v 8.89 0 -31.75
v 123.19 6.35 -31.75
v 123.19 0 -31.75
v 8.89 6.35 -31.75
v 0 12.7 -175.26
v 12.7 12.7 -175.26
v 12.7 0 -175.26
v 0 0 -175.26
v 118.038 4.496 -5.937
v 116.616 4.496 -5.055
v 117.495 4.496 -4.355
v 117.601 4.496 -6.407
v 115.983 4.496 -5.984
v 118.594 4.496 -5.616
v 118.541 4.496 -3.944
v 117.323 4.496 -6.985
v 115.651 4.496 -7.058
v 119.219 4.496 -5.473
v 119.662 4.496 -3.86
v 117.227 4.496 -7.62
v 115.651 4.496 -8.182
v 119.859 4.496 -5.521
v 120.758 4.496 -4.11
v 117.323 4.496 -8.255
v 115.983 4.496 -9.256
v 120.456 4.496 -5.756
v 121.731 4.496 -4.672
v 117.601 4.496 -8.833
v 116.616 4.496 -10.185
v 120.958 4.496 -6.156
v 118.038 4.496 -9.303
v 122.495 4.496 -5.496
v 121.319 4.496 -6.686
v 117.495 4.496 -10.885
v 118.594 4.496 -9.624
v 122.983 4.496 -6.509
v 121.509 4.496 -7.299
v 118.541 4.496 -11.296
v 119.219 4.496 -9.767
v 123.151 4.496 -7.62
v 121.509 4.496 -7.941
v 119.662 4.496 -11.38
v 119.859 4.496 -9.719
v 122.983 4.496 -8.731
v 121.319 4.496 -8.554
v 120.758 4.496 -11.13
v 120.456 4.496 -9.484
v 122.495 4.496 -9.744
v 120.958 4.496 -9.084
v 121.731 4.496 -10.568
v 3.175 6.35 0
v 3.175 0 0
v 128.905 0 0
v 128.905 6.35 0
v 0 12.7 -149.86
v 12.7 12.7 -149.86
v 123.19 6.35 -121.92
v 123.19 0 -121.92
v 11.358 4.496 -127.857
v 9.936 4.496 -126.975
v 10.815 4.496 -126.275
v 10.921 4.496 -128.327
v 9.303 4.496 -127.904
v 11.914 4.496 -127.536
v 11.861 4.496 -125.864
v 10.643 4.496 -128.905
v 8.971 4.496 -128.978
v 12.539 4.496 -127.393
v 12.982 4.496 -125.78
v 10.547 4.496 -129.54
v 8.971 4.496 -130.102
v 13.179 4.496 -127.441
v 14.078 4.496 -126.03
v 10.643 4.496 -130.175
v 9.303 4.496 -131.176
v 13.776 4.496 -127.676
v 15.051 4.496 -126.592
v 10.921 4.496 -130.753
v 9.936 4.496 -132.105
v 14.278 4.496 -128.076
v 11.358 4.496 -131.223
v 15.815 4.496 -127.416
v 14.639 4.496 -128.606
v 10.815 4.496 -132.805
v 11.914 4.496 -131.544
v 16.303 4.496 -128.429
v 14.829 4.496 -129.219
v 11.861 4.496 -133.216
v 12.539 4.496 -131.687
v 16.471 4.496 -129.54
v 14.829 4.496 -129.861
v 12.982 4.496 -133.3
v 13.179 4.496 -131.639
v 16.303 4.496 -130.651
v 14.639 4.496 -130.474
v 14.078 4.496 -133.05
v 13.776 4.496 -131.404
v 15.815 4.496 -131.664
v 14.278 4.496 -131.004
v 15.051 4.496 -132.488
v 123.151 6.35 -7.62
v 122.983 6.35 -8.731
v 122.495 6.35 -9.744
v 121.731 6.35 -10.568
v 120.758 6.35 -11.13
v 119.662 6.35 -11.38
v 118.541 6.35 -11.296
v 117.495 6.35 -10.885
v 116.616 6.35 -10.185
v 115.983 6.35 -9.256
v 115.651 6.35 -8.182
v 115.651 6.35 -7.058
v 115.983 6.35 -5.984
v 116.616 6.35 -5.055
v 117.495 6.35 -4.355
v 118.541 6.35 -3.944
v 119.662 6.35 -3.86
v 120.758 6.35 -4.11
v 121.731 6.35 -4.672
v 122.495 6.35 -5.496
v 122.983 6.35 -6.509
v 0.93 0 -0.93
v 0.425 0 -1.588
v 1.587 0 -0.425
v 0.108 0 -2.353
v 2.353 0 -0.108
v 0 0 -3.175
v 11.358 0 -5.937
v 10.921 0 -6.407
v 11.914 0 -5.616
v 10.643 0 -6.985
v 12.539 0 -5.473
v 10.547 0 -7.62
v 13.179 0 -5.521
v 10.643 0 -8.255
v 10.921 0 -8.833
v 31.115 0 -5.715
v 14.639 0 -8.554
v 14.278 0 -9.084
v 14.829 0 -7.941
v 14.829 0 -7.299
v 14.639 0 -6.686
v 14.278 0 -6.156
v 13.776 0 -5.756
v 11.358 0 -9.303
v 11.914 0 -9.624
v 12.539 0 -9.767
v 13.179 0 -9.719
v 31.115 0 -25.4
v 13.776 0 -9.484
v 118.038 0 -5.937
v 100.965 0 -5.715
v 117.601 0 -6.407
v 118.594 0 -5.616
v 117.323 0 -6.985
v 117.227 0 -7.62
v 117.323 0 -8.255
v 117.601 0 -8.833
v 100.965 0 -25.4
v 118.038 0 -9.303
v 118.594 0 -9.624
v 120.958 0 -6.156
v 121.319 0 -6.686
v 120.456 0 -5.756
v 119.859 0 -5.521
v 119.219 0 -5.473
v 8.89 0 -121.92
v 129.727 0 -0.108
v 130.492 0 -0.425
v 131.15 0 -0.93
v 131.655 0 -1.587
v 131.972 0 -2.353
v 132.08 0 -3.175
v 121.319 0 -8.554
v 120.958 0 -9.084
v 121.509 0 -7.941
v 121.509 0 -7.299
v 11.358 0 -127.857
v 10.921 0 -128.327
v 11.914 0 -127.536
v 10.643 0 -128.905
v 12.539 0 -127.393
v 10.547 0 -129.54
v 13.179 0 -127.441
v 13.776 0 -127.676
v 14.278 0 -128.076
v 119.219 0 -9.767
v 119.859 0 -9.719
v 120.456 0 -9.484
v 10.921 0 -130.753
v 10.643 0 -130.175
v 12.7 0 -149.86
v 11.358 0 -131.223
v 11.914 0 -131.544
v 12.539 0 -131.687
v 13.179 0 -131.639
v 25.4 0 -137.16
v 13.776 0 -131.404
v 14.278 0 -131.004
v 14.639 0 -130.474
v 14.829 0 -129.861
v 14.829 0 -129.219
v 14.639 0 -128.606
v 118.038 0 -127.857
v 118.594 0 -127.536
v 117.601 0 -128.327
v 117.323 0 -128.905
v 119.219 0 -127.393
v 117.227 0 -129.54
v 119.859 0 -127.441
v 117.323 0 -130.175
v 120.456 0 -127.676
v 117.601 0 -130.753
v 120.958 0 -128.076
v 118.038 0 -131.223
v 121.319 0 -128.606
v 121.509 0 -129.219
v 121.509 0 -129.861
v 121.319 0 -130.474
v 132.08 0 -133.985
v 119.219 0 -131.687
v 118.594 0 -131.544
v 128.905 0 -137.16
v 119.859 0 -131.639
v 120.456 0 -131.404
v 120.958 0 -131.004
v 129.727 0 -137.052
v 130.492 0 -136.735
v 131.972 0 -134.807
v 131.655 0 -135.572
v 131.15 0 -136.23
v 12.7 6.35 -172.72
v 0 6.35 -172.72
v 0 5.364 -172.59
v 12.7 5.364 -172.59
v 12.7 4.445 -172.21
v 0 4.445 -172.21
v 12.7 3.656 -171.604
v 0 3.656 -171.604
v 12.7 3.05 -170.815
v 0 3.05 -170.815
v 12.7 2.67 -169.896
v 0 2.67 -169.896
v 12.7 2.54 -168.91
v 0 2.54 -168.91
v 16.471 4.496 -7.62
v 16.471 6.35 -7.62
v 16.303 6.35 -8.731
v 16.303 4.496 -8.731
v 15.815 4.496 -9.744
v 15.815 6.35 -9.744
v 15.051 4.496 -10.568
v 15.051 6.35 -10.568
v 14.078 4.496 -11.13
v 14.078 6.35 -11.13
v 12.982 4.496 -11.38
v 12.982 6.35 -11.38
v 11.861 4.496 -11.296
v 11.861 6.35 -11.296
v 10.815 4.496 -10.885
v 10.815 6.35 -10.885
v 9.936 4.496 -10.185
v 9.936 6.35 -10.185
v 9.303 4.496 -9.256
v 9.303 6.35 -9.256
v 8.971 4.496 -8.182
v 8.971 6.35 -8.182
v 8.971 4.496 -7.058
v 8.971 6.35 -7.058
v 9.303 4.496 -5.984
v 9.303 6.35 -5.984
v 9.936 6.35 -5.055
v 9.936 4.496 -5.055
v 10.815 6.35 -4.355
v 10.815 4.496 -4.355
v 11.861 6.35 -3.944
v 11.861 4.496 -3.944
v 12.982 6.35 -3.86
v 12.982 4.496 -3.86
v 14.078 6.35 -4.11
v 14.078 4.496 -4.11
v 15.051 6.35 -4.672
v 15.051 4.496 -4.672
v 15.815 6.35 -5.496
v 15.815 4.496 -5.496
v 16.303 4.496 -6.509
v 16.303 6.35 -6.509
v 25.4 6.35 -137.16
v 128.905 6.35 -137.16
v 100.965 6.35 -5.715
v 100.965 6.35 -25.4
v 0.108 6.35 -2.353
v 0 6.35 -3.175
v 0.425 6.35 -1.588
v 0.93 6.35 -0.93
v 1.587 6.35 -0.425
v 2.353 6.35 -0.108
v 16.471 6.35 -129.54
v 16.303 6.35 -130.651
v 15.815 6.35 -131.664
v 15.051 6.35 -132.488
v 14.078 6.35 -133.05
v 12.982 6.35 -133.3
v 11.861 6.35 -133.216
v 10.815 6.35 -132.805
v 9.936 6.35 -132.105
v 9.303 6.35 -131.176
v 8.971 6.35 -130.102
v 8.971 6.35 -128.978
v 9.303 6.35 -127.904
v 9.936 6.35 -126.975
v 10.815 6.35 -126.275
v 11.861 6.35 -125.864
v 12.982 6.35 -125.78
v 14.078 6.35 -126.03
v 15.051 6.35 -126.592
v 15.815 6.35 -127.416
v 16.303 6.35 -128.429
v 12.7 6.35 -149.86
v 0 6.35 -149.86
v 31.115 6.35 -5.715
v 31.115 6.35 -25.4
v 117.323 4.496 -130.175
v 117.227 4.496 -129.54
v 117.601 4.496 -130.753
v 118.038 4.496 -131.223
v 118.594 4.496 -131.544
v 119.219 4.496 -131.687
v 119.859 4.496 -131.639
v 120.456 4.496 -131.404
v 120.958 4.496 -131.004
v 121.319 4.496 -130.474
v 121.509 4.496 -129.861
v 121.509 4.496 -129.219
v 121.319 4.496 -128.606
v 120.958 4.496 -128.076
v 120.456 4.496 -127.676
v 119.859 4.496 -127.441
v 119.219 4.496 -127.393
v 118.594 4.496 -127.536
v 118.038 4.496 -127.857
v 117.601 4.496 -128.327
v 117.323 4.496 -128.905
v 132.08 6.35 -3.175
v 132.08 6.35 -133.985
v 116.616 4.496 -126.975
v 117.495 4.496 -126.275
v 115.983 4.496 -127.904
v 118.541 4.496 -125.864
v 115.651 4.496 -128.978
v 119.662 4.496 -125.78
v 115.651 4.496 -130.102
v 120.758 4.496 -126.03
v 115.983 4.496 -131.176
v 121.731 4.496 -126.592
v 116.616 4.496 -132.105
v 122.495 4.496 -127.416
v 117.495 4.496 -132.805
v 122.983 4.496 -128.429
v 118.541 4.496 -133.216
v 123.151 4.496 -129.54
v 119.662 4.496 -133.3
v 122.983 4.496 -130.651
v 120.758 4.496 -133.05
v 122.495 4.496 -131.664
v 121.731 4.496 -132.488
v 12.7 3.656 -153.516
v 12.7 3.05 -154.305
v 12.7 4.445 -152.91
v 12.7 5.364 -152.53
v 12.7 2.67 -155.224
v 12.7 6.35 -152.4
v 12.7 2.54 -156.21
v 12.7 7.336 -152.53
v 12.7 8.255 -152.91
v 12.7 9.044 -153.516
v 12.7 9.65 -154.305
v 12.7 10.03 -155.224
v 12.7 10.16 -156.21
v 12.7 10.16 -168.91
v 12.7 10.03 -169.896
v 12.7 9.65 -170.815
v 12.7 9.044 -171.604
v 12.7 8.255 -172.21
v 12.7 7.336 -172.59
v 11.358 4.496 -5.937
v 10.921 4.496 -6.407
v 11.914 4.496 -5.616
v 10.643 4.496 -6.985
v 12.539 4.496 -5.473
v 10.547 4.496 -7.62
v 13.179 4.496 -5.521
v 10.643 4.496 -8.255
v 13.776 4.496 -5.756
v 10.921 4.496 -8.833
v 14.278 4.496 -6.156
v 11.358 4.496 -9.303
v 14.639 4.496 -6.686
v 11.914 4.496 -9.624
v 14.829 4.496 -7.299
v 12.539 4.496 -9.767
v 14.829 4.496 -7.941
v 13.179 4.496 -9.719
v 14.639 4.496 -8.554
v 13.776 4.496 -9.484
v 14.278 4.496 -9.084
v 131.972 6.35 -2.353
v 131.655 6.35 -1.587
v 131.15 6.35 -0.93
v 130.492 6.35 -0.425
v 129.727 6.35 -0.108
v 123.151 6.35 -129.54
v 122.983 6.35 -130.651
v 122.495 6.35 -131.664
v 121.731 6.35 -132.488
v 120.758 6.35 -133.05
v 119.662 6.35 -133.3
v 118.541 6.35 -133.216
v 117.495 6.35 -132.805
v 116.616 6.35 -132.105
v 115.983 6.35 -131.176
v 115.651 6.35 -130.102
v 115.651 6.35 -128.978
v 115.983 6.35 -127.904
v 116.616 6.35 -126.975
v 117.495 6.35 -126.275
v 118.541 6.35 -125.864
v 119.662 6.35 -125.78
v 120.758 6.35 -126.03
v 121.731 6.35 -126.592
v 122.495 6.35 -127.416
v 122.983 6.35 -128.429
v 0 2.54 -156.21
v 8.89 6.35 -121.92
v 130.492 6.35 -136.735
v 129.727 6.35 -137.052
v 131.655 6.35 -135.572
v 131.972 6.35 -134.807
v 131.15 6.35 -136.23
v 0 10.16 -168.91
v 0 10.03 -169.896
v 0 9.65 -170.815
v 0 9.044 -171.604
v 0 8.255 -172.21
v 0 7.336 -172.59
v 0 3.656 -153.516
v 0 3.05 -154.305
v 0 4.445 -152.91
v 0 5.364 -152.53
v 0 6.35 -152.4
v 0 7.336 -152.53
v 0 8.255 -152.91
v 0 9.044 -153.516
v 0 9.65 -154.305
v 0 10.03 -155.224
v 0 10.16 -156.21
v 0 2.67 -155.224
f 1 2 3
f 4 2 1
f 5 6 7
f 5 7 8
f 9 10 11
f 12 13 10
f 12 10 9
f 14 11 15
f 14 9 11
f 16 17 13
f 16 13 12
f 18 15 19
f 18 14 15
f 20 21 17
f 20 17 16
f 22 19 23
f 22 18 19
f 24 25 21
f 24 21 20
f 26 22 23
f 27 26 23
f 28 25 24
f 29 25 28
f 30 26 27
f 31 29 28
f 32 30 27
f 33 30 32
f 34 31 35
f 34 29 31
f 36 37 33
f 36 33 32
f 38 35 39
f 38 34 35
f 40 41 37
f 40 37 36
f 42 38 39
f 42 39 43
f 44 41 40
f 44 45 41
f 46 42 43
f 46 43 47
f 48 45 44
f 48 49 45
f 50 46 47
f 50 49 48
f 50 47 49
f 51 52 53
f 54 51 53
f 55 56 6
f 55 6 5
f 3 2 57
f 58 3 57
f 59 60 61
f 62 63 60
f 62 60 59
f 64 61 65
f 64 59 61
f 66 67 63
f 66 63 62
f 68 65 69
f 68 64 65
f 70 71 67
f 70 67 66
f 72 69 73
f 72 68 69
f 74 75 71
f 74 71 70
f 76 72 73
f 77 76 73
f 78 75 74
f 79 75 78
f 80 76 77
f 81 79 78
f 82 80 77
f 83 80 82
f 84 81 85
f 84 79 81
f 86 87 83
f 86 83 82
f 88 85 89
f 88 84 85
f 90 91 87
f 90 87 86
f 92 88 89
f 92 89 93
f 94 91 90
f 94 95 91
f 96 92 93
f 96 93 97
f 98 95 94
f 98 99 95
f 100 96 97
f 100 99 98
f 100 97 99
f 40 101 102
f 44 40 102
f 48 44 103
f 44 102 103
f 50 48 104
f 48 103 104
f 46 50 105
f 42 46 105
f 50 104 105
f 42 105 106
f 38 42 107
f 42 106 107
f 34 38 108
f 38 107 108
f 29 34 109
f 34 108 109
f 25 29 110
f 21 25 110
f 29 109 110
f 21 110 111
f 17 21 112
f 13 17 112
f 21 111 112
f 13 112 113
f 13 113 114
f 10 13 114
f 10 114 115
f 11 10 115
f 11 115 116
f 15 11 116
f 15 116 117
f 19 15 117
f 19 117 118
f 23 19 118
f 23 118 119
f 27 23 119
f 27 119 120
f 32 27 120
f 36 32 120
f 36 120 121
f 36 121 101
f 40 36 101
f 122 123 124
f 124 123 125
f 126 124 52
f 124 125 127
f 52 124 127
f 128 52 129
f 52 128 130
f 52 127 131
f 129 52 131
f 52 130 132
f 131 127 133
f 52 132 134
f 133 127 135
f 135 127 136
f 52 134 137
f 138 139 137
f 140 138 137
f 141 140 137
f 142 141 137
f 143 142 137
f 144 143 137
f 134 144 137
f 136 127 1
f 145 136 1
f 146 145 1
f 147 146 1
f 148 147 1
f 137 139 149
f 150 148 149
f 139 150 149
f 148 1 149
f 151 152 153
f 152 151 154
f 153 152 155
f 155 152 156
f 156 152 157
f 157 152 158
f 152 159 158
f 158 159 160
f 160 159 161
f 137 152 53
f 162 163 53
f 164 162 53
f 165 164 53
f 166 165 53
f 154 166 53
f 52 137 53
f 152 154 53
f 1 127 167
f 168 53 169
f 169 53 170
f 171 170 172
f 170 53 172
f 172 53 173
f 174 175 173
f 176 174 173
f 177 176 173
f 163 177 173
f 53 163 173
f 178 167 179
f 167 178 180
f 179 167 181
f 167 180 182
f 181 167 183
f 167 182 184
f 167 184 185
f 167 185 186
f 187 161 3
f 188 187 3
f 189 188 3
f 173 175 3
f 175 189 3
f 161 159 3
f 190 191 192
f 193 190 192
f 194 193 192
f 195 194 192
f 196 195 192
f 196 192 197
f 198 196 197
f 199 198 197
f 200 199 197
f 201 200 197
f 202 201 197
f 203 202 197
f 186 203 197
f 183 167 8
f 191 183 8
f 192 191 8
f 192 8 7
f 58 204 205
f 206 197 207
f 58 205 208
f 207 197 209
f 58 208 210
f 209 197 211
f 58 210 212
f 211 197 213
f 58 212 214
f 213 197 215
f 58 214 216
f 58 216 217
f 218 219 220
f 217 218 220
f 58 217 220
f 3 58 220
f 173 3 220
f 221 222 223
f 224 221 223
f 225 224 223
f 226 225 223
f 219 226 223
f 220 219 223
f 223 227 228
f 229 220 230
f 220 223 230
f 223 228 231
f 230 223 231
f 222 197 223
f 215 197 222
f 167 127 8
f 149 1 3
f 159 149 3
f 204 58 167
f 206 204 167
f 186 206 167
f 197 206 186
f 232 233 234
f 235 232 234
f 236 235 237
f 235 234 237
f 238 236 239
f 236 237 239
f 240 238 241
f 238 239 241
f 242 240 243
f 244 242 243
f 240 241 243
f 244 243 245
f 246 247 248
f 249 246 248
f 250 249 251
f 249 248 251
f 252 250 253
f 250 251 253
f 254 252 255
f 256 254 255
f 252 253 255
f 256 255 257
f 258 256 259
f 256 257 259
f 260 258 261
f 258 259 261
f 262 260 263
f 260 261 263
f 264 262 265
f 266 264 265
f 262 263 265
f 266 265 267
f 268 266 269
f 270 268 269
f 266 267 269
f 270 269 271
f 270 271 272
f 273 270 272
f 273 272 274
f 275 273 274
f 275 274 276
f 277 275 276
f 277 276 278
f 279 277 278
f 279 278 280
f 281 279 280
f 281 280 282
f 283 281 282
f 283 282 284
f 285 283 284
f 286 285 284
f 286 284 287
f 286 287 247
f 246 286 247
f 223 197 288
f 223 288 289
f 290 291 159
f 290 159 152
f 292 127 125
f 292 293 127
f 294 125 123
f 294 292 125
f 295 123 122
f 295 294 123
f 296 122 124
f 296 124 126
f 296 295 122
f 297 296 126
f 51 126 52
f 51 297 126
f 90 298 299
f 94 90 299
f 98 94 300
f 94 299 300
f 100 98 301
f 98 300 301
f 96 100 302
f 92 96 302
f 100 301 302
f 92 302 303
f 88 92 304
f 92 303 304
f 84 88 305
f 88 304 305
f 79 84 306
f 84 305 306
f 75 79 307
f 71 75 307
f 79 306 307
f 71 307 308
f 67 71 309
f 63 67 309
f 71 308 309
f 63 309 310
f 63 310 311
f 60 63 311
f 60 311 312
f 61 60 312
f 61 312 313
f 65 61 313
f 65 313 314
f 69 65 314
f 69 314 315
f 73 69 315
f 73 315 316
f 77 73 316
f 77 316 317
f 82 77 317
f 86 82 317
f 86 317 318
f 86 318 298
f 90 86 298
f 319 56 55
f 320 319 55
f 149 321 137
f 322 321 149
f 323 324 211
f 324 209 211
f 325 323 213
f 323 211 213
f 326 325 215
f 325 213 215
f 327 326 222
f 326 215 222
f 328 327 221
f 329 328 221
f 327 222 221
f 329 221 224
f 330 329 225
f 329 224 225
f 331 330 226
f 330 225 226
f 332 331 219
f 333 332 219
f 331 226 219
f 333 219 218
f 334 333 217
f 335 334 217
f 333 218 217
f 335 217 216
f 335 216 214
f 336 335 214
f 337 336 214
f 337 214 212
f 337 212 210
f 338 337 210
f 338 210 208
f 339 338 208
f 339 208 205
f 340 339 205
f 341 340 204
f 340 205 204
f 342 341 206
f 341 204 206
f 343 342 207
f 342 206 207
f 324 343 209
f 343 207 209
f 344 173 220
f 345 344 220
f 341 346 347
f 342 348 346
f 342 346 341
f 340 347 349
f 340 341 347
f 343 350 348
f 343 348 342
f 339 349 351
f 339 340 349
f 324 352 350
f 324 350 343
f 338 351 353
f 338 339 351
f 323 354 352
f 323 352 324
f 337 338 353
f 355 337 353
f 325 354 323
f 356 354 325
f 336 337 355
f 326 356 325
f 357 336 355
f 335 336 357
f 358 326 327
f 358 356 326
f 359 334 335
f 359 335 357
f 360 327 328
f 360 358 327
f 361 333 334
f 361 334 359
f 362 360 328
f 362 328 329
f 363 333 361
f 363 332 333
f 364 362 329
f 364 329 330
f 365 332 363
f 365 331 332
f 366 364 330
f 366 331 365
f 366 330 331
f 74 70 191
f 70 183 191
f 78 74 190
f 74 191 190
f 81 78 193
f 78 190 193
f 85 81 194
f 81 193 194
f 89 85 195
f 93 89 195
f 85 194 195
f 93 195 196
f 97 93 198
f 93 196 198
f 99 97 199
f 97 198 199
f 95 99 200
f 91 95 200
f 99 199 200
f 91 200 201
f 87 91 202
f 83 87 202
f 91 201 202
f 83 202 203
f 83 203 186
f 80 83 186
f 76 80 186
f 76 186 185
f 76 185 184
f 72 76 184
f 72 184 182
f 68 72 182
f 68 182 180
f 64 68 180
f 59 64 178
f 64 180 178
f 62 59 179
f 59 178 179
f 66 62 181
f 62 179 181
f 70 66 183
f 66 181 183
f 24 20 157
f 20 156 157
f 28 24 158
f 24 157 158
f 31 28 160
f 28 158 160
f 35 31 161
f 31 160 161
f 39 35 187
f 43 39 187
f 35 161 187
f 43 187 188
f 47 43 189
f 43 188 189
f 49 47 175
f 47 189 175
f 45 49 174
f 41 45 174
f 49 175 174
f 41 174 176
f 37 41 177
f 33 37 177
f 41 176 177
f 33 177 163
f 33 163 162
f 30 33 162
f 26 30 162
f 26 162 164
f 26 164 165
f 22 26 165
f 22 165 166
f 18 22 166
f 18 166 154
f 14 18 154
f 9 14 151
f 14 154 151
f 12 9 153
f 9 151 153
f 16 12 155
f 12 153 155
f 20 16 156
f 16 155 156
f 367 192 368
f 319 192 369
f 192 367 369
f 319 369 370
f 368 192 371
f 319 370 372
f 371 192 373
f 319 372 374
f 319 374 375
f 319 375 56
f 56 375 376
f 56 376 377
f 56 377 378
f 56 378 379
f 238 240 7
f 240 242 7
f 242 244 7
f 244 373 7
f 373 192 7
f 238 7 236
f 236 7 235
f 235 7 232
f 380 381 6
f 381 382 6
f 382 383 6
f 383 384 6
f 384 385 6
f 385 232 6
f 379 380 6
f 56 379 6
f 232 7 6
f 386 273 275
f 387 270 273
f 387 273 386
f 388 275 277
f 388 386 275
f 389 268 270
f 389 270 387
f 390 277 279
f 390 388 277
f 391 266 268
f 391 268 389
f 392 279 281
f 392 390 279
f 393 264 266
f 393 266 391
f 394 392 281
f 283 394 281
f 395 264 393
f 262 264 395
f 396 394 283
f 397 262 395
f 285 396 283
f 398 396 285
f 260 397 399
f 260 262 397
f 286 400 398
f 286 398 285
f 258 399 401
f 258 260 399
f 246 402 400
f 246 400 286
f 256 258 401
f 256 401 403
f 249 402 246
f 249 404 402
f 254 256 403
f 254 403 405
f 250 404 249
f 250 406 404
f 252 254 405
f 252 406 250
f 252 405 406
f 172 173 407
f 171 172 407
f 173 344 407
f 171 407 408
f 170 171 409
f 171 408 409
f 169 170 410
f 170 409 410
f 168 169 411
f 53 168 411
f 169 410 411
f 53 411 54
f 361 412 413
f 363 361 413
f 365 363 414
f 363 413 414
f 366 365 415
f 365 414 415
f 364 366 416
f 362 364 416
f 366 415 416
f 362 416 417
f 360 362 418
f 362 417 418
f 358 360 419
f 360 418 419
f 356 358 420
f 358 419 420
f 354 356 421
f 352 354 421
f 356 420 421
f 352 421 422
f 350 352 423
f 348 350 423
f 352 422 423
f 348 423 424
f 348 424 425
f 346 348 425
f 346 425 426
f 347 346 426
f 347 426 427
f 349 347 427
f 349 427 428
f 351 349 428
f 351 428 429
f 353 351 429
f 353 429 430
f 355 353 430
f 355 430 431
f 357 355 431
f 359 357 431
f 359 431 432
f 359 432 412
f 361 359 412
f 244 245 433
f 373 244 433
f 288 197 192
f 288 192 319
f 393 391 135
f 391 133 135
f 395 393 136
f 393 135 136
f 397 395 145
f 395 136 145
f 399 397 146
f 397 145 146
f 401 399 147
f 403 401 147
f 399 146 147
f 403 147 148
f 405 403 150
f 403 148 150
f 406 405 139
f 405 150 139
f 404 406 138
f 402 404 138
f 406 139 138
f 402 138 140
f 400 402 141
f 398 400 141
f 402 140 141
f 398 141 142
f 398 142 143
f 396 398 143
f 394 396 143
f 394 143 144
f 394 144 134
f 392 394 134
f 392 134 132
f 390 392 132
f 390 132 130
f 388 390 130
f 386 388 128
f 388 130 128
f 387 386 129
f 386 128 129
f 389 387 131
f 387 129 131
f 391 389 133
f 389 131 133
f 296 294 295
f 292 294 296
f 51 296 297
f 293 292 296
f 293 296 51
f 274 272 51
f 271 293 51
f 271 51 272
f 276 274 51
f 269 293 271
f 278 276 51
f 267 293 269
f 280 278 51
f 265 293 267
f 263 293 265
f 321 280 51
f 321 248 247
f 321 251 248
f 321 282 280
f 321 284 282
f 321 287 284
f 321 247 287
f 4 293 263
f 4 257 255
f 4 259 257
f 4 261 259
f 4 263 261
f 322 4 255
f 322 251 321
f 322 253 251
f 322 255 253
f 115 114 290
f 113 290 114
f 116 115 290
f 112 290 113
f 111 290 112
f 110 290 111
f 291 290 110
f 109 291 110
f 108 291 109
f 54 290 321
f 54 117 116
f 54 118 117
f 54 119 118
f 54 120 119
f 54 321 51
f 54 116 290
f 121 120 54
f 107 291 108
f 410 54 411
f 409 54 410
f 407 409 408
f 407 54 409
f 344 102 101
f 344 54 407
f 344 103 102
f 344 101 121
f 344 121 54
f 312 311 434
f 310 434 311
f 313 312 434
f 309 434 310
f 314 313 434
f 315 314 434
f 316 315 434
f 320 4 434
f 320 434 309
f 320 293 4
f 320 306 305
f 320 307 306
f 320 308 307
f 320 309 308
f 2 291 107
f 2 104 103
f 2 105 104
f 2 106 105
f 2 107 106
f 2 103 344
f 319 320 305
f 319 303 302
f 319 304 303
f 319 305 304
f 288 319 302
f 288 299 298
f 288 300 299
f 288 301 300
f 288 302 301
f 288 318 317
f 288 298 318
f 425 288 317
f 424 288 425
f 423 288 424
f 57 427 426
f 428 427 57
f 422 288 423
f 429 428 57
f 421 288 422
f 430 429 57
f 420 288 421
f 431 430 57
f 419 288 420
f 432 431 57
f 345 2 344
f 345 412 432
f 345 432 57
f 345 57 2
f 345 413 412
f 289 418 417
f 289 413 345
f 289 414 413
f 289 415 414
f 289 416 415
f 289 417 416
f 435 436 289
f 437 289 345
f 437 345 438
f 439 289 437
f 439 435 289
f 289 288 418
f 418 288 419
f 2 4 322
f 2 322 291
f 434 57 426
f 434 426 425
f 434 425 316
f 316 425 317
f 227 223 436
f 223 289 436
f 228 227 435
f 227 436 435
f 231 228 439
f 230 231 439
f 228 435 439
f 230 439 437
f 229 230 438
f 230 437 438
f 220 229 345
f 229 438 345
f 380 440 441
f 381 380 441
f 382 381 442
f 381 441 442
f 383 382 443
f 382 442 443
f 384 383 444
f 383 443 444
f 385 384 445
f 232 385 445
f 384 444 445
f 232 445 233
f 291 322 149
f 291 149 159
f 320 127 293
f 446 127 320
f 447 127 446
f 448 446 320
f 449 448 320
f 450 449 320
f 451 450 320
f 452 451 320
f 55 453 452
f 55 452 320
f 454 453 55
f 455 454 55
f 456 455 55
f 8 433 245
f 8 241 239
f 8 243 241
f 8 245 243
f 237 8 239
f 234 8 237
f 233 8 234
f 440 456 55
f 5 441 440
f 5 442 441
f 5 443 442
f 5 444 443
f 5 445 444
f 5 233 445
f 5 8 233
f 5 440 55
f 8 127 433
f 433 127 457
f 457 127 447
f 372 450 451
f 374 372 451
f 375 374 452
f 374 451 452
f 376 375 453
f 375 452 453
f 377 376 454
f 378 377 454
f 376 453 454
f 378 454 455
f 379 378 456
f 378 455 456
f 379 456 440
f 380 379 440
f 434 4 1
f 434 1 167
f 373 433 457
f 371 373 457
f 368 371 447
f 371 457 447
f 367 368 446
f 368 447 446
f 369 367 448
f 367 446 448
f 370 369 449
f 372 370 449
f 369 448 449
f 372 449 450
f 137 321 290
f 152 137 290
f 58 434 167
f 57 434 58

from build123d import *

# Parameters (mm, degrees)
SKETCH1_W                                      = 132.08
SKETCH1_H                                      = 137.16
BOSS_EXTRUDE1_DEPTH                            = 6.35
CBORE_FOR_6_BUTTON_HEAD_CAP_SCREW1_D           = 4.3053
CBORE_FOR_6_BUTTON_HEAD_CAP_SCREW1_CBORE_D     = 7.54126
CBORE_FOR_6_BUTTON_HEAD_CAP_SCREW1_CBORE_DEPTH = 1.8542
SKETCH5_W                                      = 114.3
SKETCH5_H                                      = 106.68
CUT_EXTRUDE1_DEPTH                             = 191.521165491
SKETCH6_W                                      = 12.7
SKETCH6_H                                      = 38.1
BOSS_EXTRUDE2_DEPTH                            = 6.35
SKETCH7_W                                      = 12.7
SKETCH7_H                                      = 6.35
BOSS_EXTRUDE3_DEPTH                            = 25.4
CUT_EXTRUDE2_REACH                             = 221.824
CHAMFER1_SIZE                                  = 12.7
CUT_EXTRUDE3_REACH                             = 221.548
SKETCH9_W                                      = 69.85
SKETCH9_H                                      = 9.525
FILLET1_R                                      = 3.175
BOSS_EXTRUDE4_DEPTH                            = 6.35


with BuildPart() as part:
    # Sketch1 → Boss-Extrude1 (new body)
    with BuildSketch(Plane(origin=(0, 0, 0), x_dir=(1, 0, 0), z_dir=(0, 1, 0))):
        with Locations((66.04, 68.58)):
            Rectangle(SKETCH1_W, SKETCH1_H)
    extrude(amount=BOSS_EXTRUDE1_DEPTH)

    # CBORE for #6 Button Head Cap Screw1 (through all)
    with Locations(Plane(origin=(0, 6.35, 0), x_dir=(1, 0, 0), z_dir=(0, 1, 0))):
        with Locations((12.7, 129.54), (119.38, 129.54), (119.38, 7.62), (12.7, 7.62)):
            CounterBoreHole(CBORE_FOR_6_BUTTON_HEAD_CAP_SCREW1_D / 2, CBORE_FOR_6_BUTTON_HEAD_CAP_SCREW1_CBORE_D / 2, CBORE_FOR_6_BUTTON_HEAD_CAP_SCREW1_CBORE_DEPTH)

    # Sketch5 → Cut-Extrude1 (cut, through all)
    with BuildSketch(Plane(origin=(0, 6.35, 0), x_dir=(1, 0, 0), z_dir=(0, 1, 0))):
        with Locations((66.04, 68.58)):
            Rectangle(SKETCH5_W, SKETCH5_H)
    extrude(amount=-CUT_EXTRUDE1_DEPTH, mode=Mode.SUBTRACT)

    # Sketch6 → Boss-Extrude2 (add)
    with BuildSketch(Plane(origin=(0, 0, 0), x_dir=(-1, 0, 0), z_dir=(0, -1, 0))):
        with Locations((-6.35, 156.21)):
            Rectangle(SKETCH6_W, SKETCH6_H)
    extrude(amount=-BOSS_EXTRUDE2_DEPTH)

    # Sketch7 → Boss-Extrude3 (add)
    with BuildSketch(Plane(origin=(0, 0, -175.26), x_dir=(-1, 0, 0), z_dir=(0, 0, -1))):
        with Locations((-6.35, 9.525)):
            Rectangle(SKETCH7_W, SKETCH7_H)
    extrude(amount=-BOSS_EXTRUDE3_DEPTH)

    # Sketch8 → Cut-Extrude2 (cut, up to next)
    with BuildSketch(Plane.ZY, mode=Mode.PRIVATE) as cut_extrude2_sk1:
        with BuildLine():
            Line((-152.4, 6.35), (-172.72, 6.35))
            ThreePointArc((-172.72, 6.35), (-171.604076836, 3.655923164), (-168.91, 2.54))
            Line((-168.91, 2.54), (-156.21, 2.54))
            ThreePointArc((-156.21, 2.54), (-153.515923164, 3.655923164), (-152.4, 6.35))
        make_face()
    cut_extrude2_tool1 = extrude(cut_extrude2_sk1.sketch, amount=-CUT_EXTRUDE2_REACH, mode=Mode.PRIVATE) & part.part
    # Sketch8 → Cut-Extrude2 (cut, up to next)
    with BuildSketch(Plane.ZY, mode=Mode.PRIVATE) as cut_extrude2_sk2:
        with BuildLine():
            ThreePointArc((-168.91, 10.16), (-171.604076836, 9.044076836), (-172.72, 6.35))
            Line((-172.72, 6.35), (-152.4, 6.35))
            ThreePointArc((-152.4, 6.35), (-153.515923164, 9.044076836), (-156.21, 10.16))
            Line((-156.21, 10.16), (-168.91, 10.16))
        make_face()
    cut_extrude2_tool2 = extrude(cut_extrude2_sk2.sketch, amount=-CUT_EXTRUDE2_REACH, mode=Mode.PRIVATE) & part.part
    add(cut_extrude2_tool1.solids().sort_by_distance((0, 4.537242, -162.56))[0], mode=Mode.SUBTRACT)
    add(cut_extrude2_tool2.solids().sort_by_distance((0, 8.162758, -162.56))[0], mode=Mode.SUBTRACT)

    # Chamfer1
    chamfer1_edges = [part.edges().sort_by_distance(p)[0] for p in [
        (12.7, 3.175, -137.16),
    ]]
    chamfer(chamfer1_edges, length=CHAMFER1_SIZE)

    # Sketch9 → Cut-Extrude3 (cut, up to next)
    with BuildSketch(Plane(origin=(0, 6.35, 0), x_dir=(1, 0, 0), z_dir=(0, 1, 0)), mode=Mode.PRIVATE) as cut_extrude3_sk1:
        with Locations((66.04, 10.4775)):
            Rectangle(SKETCH9_W, SKETCH9_H)
    cut_extrude3_tool1 = extrude(cut_extrude3_sk1.sketch, amount=-CUT_EXTRUDE3_REACH, mode=Mode.PRIVATE) & part.part
    add(cut_extrude3_tool1.solids().sort_by_distance((66.04, 6.35, -10.4775))[0], mode=Mode.SUBTRACT)

    # Fillet1
    fillet1_edges = [part.edges().sort_by_distance(p)[0] for p in [
        (132.08, 3.175, -137.16),
        (132.08, 3.175, 0),
        (0, 3.175, 0),
    ]]
    fillet(fillet1_edges, radius=FILLET1_R)

    # Sketch11 → Boss-Extrude4 (add)
    with BuildSketch(Plane(origin=(0, 6.35, 0), x_dir=(1, 0, 0), z_dir=(0, 1, 0))):
        Polygon((8.89, 15.24), (31.115, 15.24), (31.115, 25.4), (100.965, 25.4), (100.965, 15.24), (123.19, 15.24), (123.19, 31.75), (8.89, 31.75), align=None)
    extrude(amount=-BOSS_EXTRUDE4_DEPTH)


solid = part.part
